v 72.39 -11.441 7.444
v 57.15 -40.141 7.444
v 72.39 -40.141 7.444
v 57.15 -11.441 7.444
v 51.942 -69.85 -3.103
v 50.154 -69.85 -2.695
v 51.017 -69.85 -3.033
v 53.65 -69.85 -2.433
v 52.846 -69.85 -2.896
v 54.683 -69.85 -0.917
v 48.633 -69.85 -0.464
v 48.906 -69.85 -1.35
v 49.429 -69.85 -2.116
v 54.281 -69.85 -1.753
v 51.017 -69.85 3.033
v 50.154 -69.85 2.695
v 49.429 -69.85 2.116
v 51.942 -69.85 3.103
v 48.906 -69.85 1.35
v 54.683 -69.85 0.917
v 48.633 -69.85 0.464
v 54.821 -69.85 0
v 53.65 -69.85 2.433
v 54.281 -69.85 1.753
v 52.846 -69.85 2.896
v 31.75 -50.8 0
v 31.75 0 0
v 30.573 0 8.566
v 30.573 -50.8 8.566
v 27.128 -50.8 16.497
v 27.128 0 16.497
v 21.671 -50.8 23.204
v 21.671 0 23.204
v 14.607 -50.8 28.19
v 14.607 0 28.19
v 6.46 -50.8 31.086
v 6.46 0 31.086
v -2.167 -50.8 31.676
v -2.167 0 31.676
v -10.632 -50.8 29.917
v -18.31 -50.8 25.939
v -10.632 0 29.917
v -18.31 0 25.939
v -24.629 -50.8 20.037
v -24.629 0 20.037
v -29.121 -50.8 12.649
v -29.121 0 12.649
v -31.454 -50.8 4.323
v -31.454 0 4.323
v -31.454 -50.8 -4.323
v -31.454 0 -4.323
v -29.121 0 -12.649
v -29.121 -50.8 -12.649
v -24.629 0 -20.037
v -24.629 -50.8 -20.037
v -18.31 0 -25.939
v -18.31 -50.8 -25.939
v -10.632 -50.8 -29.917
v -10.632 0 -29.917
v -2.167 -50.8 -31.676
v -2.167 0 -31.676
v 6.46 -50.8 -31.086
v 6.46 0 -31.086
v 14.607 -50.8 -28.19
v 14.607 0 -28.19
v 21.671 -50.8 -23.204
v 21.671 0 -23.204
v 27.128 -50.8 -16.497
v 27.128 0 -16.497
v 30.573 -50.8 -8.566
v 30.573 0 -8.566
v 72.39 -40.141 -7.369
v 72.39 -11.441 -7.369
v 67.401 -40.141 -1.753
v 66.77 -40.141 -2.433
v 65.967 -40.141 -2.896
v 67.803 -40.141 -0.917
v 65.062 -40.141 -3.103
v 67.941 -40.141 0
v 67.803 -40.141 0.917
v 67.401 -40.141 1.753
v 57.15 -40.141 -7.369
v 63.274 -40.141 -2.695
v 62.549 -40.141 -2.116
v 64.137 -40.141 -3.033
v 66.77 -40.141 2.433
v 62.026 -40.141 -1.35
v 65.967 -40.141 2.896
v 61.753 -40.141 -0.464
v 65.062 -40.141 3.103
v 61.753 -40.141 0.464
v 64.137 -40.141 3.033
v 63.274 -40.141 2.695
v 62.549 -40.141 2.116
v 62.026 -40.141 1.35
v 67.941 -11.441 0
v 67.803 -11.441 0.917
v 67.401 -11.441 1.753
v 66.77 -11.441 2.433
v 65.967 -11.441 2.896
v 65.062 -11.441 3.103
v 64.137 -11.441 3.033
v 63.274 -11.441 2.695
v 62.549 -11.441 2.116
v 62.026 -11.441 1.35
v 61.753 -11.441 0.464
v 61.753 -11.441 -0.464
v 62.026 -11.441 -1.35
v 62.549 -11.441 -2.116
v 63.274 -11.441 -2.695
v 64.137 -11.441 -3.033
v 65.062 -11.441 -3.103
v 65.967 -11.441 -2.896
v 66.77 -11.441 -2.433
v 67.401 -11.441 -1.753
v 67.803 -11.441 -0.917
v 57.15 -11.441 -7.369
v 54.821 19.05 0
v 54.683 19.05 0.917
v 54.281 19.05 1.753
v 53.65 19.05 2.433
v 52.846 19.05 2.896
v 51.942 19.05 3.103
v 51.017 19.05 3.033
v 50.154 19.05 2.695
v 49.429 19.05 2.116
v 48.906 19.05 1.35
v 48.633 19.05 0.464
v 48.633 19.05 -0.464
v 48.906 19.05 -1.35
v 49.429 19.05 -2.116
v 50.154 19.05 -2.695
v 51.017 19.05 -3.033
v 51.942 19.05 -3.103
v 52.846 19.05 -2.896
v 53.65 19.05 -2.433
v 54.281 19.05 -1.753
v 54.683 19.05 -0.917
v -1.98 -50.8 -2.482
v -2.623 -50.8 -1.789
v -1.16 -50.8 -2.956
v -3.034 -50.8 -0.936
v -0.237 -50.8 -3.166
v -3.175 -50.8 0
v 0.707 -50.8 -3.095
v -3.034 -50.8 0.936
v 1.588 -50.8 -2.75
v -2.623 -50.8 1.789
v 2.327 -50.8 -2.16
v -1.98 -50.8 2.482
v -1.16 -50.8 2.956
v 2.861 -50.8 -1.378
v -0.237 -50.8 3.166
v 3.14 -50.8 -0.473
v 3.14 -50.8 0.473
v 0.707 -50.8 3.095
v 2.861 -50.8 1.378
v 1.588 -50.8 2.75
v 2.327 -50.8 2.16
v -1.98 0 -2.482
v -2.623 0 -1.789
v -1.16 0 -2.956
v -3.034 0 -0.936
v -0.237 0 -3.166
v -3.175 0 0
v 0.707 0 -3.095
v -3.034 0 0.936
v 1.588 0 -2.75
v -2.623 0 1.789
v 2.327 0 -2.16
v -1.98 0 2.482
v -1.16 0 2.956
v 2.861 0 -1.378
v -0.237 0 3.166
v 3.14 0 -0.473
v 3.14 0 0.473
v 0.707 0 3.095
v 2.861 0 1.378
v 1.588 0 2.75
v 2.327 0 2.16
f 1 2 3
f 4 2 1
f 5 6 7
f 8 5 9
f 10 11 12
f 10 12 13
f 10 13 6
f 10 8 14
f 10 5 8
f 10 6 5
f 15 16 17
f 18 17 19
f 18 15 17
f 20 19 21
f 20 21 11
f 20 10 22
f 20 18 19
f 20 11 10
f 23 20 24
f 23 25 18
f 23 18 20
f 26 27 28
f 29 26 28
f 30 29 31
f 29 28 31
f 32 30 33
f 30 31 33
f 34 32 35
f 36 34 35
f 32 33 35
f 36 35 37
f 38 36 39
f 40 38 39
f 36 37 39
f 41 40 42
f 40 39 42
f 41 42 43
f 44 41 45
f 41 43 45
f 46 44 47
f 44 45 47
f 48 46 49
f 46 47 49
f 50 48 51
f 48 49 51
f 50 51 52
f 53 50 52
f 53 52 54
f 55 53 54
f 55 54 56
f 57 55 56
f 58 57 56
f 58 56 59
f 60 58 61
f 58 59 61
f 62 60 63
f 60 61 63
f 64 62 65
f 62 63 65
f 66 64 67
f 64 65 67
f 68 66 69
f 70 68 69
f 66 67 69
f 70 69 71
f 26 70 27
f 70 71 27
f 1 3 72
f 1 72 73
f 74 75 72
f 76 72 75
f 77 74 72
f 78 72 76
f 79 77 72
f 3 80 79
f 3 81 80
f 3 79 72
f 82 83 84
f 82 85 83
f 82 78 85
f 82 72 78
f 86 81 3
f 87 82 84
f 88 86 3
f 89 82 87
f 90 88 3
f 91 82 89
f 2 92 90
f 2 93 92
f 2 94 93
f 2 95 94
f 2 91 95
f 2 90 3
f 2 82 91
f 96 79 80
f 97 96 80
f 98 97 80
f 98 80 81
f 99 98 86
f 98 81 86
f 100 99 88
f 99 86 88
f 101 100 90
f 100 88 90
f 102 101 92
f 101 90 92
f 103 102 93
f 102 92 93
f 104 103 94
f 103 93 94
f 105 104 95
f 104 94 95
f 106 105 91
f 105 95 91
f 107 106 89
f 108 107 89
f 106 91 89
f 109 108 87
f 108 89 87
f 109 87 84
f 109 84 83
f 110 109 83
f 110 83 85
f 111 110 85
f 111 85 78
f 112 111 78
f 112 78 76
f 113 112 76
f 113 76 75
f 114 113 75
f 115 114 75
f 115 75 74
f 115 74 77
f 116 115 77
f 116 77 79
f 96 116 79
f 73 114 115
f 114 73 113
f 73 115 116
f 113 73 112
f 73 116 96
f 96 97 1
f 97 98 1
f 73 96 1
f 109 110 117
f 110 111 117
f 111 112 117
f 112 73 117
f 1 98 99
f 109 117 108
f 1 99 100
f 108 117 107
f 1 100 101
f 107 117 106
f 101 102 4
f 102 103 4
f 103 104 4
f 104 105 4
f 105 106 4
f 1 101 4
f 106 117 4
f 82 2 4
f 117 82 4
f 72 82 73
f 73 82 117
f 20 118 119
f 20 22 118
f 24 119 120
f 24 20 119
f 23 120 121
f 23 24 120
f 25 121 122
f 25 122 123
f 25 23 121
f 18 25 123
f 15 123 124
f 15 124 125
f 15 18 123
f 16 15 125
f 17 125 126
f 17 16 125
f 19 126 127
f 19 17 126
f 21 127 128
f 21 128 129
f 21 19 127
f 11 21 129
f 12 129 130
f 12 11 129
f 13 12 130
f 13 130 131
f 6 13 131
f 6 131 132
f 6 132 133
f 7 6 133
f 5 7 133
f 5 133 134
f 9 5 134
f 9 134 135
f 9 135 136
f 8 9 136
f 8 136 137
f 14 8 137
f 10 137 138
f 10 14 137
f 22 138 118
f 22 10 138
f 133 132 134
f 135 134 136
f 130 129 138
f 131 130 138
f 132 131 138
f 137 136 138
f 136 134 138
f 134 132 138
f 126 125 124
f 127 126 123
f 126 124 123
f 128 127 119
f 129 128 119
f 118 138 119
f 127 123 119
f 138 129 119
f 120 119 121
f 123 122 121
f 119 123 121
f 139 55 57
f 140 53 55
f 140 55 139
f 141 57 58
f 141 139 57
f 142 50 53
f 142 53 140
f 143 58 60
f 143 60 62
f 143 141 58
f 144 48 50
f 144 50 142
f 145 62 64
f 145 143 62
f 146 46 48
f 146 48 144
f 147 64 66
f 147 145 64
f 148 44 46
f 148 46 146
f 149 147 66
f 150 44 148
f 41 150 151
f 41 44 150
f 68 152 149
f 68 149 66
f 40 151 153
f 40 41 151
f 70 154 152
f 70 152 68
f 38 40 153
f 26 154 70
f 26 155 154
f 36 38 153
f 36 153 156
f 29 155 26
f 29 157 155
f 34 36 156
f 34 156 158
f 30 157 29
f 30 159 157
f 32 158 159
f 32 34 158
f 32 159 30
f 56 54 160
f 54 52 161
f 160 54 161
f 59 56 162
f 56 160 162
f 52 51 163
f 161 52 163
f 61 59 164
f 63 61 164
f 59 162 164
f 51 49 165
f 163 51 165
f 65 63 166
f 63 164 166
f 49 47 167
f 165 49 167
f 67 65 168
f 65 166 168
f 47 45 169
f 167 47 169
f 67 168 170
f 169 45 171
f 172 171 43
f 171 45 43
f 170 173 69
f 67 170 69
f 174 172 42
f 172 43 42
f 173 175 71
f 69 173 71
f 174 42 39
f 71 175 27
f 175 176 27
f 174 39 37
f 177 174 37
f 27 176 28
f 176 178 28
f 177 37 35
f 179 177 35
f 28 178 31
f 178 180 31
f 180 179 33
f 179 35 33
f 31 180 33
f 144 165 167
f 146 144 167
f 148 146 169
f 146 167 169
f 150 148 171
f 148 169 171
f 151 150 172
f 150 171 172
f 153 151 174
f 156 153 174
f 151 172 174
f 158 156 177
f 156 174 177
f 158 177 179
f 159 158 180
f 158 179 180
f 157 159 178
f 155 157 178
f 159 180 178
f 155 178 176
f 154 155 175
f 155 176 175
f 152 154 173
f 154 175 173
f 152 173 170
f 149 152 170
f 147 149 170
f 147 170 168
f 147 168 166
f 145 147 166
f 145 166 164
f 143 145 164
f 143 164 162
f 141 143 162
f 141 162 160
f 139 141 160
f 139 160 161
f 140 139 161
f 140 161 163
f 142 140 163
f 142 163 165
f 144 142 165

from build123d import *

# Parameters (mm, degrees)
F0_R          = 31.75
F1_DEPTH      = 50.8
F2_R          = 3.175
F3_DEPTH      = 50.801
F0_R_2        = 3.1115
F4_DEPTH      = 69.85
F4_DEPTH_BACK = 19.05
F6_START      = 57.15
F5_W          = 28.6999354139
F5_H          = 14.8128718138
F6_DEPTH      = 15.24
F7_R          = 3.1115
F8_DEPTH      = 59.191774101


with BuildPart() as f1:
    # F0 (on Front) → F1 (new body)
    with BuildSketch(Plane.XZ):
        Circle(F0_R)
    extrude(amount=F1_DEPTH)

    # F2 (on face) → F3 (cut, through all)
    with BuildSketch(Plane(origin=(0, 0, 0), x_dir=(-1, 0, 0), z_dir=(0, 1, 0))):
        Circle(F2_R)
    extrude(amount=-F3_DEPTH, mode=Mode.SUBTRACT)


with BuildPart() as f4:
    # F0 (on Front) → F4 (new body, two sides)
    with BuildSketch(Plane.XZ) as f4_sk:
        with Locations((51.7096742988, 0)):
            Circle(F0_R_2)
    extrude(amount=F4_DEPTH)
    extrude(f4_sk.sketch, amount=-F4_DEPTH_BACK)


with BuildPart() as f6:
    # F5 (on Right) → F6 (new body)
    with BuildSketch(Plane.YZ.offset(F6_START)):
        with Locations((-25.7908063941, 0.0374768861)):
            Rectangle(F5_W, F5_H)
    extrude(amount=F6_DEPTH)

    # F7 (on face) → F8 (cut, through all)
    with BuildSketch(Plane.XZ.offset(40.140774101)):
        with Locations((64.8297667503, 0)):
            Circle(F7_R)
    extrude(amount=-F8_DEPTH, mode=Mode.SUBTRACT)


solid = Compound([f1.part, f4.part, f6.part])
